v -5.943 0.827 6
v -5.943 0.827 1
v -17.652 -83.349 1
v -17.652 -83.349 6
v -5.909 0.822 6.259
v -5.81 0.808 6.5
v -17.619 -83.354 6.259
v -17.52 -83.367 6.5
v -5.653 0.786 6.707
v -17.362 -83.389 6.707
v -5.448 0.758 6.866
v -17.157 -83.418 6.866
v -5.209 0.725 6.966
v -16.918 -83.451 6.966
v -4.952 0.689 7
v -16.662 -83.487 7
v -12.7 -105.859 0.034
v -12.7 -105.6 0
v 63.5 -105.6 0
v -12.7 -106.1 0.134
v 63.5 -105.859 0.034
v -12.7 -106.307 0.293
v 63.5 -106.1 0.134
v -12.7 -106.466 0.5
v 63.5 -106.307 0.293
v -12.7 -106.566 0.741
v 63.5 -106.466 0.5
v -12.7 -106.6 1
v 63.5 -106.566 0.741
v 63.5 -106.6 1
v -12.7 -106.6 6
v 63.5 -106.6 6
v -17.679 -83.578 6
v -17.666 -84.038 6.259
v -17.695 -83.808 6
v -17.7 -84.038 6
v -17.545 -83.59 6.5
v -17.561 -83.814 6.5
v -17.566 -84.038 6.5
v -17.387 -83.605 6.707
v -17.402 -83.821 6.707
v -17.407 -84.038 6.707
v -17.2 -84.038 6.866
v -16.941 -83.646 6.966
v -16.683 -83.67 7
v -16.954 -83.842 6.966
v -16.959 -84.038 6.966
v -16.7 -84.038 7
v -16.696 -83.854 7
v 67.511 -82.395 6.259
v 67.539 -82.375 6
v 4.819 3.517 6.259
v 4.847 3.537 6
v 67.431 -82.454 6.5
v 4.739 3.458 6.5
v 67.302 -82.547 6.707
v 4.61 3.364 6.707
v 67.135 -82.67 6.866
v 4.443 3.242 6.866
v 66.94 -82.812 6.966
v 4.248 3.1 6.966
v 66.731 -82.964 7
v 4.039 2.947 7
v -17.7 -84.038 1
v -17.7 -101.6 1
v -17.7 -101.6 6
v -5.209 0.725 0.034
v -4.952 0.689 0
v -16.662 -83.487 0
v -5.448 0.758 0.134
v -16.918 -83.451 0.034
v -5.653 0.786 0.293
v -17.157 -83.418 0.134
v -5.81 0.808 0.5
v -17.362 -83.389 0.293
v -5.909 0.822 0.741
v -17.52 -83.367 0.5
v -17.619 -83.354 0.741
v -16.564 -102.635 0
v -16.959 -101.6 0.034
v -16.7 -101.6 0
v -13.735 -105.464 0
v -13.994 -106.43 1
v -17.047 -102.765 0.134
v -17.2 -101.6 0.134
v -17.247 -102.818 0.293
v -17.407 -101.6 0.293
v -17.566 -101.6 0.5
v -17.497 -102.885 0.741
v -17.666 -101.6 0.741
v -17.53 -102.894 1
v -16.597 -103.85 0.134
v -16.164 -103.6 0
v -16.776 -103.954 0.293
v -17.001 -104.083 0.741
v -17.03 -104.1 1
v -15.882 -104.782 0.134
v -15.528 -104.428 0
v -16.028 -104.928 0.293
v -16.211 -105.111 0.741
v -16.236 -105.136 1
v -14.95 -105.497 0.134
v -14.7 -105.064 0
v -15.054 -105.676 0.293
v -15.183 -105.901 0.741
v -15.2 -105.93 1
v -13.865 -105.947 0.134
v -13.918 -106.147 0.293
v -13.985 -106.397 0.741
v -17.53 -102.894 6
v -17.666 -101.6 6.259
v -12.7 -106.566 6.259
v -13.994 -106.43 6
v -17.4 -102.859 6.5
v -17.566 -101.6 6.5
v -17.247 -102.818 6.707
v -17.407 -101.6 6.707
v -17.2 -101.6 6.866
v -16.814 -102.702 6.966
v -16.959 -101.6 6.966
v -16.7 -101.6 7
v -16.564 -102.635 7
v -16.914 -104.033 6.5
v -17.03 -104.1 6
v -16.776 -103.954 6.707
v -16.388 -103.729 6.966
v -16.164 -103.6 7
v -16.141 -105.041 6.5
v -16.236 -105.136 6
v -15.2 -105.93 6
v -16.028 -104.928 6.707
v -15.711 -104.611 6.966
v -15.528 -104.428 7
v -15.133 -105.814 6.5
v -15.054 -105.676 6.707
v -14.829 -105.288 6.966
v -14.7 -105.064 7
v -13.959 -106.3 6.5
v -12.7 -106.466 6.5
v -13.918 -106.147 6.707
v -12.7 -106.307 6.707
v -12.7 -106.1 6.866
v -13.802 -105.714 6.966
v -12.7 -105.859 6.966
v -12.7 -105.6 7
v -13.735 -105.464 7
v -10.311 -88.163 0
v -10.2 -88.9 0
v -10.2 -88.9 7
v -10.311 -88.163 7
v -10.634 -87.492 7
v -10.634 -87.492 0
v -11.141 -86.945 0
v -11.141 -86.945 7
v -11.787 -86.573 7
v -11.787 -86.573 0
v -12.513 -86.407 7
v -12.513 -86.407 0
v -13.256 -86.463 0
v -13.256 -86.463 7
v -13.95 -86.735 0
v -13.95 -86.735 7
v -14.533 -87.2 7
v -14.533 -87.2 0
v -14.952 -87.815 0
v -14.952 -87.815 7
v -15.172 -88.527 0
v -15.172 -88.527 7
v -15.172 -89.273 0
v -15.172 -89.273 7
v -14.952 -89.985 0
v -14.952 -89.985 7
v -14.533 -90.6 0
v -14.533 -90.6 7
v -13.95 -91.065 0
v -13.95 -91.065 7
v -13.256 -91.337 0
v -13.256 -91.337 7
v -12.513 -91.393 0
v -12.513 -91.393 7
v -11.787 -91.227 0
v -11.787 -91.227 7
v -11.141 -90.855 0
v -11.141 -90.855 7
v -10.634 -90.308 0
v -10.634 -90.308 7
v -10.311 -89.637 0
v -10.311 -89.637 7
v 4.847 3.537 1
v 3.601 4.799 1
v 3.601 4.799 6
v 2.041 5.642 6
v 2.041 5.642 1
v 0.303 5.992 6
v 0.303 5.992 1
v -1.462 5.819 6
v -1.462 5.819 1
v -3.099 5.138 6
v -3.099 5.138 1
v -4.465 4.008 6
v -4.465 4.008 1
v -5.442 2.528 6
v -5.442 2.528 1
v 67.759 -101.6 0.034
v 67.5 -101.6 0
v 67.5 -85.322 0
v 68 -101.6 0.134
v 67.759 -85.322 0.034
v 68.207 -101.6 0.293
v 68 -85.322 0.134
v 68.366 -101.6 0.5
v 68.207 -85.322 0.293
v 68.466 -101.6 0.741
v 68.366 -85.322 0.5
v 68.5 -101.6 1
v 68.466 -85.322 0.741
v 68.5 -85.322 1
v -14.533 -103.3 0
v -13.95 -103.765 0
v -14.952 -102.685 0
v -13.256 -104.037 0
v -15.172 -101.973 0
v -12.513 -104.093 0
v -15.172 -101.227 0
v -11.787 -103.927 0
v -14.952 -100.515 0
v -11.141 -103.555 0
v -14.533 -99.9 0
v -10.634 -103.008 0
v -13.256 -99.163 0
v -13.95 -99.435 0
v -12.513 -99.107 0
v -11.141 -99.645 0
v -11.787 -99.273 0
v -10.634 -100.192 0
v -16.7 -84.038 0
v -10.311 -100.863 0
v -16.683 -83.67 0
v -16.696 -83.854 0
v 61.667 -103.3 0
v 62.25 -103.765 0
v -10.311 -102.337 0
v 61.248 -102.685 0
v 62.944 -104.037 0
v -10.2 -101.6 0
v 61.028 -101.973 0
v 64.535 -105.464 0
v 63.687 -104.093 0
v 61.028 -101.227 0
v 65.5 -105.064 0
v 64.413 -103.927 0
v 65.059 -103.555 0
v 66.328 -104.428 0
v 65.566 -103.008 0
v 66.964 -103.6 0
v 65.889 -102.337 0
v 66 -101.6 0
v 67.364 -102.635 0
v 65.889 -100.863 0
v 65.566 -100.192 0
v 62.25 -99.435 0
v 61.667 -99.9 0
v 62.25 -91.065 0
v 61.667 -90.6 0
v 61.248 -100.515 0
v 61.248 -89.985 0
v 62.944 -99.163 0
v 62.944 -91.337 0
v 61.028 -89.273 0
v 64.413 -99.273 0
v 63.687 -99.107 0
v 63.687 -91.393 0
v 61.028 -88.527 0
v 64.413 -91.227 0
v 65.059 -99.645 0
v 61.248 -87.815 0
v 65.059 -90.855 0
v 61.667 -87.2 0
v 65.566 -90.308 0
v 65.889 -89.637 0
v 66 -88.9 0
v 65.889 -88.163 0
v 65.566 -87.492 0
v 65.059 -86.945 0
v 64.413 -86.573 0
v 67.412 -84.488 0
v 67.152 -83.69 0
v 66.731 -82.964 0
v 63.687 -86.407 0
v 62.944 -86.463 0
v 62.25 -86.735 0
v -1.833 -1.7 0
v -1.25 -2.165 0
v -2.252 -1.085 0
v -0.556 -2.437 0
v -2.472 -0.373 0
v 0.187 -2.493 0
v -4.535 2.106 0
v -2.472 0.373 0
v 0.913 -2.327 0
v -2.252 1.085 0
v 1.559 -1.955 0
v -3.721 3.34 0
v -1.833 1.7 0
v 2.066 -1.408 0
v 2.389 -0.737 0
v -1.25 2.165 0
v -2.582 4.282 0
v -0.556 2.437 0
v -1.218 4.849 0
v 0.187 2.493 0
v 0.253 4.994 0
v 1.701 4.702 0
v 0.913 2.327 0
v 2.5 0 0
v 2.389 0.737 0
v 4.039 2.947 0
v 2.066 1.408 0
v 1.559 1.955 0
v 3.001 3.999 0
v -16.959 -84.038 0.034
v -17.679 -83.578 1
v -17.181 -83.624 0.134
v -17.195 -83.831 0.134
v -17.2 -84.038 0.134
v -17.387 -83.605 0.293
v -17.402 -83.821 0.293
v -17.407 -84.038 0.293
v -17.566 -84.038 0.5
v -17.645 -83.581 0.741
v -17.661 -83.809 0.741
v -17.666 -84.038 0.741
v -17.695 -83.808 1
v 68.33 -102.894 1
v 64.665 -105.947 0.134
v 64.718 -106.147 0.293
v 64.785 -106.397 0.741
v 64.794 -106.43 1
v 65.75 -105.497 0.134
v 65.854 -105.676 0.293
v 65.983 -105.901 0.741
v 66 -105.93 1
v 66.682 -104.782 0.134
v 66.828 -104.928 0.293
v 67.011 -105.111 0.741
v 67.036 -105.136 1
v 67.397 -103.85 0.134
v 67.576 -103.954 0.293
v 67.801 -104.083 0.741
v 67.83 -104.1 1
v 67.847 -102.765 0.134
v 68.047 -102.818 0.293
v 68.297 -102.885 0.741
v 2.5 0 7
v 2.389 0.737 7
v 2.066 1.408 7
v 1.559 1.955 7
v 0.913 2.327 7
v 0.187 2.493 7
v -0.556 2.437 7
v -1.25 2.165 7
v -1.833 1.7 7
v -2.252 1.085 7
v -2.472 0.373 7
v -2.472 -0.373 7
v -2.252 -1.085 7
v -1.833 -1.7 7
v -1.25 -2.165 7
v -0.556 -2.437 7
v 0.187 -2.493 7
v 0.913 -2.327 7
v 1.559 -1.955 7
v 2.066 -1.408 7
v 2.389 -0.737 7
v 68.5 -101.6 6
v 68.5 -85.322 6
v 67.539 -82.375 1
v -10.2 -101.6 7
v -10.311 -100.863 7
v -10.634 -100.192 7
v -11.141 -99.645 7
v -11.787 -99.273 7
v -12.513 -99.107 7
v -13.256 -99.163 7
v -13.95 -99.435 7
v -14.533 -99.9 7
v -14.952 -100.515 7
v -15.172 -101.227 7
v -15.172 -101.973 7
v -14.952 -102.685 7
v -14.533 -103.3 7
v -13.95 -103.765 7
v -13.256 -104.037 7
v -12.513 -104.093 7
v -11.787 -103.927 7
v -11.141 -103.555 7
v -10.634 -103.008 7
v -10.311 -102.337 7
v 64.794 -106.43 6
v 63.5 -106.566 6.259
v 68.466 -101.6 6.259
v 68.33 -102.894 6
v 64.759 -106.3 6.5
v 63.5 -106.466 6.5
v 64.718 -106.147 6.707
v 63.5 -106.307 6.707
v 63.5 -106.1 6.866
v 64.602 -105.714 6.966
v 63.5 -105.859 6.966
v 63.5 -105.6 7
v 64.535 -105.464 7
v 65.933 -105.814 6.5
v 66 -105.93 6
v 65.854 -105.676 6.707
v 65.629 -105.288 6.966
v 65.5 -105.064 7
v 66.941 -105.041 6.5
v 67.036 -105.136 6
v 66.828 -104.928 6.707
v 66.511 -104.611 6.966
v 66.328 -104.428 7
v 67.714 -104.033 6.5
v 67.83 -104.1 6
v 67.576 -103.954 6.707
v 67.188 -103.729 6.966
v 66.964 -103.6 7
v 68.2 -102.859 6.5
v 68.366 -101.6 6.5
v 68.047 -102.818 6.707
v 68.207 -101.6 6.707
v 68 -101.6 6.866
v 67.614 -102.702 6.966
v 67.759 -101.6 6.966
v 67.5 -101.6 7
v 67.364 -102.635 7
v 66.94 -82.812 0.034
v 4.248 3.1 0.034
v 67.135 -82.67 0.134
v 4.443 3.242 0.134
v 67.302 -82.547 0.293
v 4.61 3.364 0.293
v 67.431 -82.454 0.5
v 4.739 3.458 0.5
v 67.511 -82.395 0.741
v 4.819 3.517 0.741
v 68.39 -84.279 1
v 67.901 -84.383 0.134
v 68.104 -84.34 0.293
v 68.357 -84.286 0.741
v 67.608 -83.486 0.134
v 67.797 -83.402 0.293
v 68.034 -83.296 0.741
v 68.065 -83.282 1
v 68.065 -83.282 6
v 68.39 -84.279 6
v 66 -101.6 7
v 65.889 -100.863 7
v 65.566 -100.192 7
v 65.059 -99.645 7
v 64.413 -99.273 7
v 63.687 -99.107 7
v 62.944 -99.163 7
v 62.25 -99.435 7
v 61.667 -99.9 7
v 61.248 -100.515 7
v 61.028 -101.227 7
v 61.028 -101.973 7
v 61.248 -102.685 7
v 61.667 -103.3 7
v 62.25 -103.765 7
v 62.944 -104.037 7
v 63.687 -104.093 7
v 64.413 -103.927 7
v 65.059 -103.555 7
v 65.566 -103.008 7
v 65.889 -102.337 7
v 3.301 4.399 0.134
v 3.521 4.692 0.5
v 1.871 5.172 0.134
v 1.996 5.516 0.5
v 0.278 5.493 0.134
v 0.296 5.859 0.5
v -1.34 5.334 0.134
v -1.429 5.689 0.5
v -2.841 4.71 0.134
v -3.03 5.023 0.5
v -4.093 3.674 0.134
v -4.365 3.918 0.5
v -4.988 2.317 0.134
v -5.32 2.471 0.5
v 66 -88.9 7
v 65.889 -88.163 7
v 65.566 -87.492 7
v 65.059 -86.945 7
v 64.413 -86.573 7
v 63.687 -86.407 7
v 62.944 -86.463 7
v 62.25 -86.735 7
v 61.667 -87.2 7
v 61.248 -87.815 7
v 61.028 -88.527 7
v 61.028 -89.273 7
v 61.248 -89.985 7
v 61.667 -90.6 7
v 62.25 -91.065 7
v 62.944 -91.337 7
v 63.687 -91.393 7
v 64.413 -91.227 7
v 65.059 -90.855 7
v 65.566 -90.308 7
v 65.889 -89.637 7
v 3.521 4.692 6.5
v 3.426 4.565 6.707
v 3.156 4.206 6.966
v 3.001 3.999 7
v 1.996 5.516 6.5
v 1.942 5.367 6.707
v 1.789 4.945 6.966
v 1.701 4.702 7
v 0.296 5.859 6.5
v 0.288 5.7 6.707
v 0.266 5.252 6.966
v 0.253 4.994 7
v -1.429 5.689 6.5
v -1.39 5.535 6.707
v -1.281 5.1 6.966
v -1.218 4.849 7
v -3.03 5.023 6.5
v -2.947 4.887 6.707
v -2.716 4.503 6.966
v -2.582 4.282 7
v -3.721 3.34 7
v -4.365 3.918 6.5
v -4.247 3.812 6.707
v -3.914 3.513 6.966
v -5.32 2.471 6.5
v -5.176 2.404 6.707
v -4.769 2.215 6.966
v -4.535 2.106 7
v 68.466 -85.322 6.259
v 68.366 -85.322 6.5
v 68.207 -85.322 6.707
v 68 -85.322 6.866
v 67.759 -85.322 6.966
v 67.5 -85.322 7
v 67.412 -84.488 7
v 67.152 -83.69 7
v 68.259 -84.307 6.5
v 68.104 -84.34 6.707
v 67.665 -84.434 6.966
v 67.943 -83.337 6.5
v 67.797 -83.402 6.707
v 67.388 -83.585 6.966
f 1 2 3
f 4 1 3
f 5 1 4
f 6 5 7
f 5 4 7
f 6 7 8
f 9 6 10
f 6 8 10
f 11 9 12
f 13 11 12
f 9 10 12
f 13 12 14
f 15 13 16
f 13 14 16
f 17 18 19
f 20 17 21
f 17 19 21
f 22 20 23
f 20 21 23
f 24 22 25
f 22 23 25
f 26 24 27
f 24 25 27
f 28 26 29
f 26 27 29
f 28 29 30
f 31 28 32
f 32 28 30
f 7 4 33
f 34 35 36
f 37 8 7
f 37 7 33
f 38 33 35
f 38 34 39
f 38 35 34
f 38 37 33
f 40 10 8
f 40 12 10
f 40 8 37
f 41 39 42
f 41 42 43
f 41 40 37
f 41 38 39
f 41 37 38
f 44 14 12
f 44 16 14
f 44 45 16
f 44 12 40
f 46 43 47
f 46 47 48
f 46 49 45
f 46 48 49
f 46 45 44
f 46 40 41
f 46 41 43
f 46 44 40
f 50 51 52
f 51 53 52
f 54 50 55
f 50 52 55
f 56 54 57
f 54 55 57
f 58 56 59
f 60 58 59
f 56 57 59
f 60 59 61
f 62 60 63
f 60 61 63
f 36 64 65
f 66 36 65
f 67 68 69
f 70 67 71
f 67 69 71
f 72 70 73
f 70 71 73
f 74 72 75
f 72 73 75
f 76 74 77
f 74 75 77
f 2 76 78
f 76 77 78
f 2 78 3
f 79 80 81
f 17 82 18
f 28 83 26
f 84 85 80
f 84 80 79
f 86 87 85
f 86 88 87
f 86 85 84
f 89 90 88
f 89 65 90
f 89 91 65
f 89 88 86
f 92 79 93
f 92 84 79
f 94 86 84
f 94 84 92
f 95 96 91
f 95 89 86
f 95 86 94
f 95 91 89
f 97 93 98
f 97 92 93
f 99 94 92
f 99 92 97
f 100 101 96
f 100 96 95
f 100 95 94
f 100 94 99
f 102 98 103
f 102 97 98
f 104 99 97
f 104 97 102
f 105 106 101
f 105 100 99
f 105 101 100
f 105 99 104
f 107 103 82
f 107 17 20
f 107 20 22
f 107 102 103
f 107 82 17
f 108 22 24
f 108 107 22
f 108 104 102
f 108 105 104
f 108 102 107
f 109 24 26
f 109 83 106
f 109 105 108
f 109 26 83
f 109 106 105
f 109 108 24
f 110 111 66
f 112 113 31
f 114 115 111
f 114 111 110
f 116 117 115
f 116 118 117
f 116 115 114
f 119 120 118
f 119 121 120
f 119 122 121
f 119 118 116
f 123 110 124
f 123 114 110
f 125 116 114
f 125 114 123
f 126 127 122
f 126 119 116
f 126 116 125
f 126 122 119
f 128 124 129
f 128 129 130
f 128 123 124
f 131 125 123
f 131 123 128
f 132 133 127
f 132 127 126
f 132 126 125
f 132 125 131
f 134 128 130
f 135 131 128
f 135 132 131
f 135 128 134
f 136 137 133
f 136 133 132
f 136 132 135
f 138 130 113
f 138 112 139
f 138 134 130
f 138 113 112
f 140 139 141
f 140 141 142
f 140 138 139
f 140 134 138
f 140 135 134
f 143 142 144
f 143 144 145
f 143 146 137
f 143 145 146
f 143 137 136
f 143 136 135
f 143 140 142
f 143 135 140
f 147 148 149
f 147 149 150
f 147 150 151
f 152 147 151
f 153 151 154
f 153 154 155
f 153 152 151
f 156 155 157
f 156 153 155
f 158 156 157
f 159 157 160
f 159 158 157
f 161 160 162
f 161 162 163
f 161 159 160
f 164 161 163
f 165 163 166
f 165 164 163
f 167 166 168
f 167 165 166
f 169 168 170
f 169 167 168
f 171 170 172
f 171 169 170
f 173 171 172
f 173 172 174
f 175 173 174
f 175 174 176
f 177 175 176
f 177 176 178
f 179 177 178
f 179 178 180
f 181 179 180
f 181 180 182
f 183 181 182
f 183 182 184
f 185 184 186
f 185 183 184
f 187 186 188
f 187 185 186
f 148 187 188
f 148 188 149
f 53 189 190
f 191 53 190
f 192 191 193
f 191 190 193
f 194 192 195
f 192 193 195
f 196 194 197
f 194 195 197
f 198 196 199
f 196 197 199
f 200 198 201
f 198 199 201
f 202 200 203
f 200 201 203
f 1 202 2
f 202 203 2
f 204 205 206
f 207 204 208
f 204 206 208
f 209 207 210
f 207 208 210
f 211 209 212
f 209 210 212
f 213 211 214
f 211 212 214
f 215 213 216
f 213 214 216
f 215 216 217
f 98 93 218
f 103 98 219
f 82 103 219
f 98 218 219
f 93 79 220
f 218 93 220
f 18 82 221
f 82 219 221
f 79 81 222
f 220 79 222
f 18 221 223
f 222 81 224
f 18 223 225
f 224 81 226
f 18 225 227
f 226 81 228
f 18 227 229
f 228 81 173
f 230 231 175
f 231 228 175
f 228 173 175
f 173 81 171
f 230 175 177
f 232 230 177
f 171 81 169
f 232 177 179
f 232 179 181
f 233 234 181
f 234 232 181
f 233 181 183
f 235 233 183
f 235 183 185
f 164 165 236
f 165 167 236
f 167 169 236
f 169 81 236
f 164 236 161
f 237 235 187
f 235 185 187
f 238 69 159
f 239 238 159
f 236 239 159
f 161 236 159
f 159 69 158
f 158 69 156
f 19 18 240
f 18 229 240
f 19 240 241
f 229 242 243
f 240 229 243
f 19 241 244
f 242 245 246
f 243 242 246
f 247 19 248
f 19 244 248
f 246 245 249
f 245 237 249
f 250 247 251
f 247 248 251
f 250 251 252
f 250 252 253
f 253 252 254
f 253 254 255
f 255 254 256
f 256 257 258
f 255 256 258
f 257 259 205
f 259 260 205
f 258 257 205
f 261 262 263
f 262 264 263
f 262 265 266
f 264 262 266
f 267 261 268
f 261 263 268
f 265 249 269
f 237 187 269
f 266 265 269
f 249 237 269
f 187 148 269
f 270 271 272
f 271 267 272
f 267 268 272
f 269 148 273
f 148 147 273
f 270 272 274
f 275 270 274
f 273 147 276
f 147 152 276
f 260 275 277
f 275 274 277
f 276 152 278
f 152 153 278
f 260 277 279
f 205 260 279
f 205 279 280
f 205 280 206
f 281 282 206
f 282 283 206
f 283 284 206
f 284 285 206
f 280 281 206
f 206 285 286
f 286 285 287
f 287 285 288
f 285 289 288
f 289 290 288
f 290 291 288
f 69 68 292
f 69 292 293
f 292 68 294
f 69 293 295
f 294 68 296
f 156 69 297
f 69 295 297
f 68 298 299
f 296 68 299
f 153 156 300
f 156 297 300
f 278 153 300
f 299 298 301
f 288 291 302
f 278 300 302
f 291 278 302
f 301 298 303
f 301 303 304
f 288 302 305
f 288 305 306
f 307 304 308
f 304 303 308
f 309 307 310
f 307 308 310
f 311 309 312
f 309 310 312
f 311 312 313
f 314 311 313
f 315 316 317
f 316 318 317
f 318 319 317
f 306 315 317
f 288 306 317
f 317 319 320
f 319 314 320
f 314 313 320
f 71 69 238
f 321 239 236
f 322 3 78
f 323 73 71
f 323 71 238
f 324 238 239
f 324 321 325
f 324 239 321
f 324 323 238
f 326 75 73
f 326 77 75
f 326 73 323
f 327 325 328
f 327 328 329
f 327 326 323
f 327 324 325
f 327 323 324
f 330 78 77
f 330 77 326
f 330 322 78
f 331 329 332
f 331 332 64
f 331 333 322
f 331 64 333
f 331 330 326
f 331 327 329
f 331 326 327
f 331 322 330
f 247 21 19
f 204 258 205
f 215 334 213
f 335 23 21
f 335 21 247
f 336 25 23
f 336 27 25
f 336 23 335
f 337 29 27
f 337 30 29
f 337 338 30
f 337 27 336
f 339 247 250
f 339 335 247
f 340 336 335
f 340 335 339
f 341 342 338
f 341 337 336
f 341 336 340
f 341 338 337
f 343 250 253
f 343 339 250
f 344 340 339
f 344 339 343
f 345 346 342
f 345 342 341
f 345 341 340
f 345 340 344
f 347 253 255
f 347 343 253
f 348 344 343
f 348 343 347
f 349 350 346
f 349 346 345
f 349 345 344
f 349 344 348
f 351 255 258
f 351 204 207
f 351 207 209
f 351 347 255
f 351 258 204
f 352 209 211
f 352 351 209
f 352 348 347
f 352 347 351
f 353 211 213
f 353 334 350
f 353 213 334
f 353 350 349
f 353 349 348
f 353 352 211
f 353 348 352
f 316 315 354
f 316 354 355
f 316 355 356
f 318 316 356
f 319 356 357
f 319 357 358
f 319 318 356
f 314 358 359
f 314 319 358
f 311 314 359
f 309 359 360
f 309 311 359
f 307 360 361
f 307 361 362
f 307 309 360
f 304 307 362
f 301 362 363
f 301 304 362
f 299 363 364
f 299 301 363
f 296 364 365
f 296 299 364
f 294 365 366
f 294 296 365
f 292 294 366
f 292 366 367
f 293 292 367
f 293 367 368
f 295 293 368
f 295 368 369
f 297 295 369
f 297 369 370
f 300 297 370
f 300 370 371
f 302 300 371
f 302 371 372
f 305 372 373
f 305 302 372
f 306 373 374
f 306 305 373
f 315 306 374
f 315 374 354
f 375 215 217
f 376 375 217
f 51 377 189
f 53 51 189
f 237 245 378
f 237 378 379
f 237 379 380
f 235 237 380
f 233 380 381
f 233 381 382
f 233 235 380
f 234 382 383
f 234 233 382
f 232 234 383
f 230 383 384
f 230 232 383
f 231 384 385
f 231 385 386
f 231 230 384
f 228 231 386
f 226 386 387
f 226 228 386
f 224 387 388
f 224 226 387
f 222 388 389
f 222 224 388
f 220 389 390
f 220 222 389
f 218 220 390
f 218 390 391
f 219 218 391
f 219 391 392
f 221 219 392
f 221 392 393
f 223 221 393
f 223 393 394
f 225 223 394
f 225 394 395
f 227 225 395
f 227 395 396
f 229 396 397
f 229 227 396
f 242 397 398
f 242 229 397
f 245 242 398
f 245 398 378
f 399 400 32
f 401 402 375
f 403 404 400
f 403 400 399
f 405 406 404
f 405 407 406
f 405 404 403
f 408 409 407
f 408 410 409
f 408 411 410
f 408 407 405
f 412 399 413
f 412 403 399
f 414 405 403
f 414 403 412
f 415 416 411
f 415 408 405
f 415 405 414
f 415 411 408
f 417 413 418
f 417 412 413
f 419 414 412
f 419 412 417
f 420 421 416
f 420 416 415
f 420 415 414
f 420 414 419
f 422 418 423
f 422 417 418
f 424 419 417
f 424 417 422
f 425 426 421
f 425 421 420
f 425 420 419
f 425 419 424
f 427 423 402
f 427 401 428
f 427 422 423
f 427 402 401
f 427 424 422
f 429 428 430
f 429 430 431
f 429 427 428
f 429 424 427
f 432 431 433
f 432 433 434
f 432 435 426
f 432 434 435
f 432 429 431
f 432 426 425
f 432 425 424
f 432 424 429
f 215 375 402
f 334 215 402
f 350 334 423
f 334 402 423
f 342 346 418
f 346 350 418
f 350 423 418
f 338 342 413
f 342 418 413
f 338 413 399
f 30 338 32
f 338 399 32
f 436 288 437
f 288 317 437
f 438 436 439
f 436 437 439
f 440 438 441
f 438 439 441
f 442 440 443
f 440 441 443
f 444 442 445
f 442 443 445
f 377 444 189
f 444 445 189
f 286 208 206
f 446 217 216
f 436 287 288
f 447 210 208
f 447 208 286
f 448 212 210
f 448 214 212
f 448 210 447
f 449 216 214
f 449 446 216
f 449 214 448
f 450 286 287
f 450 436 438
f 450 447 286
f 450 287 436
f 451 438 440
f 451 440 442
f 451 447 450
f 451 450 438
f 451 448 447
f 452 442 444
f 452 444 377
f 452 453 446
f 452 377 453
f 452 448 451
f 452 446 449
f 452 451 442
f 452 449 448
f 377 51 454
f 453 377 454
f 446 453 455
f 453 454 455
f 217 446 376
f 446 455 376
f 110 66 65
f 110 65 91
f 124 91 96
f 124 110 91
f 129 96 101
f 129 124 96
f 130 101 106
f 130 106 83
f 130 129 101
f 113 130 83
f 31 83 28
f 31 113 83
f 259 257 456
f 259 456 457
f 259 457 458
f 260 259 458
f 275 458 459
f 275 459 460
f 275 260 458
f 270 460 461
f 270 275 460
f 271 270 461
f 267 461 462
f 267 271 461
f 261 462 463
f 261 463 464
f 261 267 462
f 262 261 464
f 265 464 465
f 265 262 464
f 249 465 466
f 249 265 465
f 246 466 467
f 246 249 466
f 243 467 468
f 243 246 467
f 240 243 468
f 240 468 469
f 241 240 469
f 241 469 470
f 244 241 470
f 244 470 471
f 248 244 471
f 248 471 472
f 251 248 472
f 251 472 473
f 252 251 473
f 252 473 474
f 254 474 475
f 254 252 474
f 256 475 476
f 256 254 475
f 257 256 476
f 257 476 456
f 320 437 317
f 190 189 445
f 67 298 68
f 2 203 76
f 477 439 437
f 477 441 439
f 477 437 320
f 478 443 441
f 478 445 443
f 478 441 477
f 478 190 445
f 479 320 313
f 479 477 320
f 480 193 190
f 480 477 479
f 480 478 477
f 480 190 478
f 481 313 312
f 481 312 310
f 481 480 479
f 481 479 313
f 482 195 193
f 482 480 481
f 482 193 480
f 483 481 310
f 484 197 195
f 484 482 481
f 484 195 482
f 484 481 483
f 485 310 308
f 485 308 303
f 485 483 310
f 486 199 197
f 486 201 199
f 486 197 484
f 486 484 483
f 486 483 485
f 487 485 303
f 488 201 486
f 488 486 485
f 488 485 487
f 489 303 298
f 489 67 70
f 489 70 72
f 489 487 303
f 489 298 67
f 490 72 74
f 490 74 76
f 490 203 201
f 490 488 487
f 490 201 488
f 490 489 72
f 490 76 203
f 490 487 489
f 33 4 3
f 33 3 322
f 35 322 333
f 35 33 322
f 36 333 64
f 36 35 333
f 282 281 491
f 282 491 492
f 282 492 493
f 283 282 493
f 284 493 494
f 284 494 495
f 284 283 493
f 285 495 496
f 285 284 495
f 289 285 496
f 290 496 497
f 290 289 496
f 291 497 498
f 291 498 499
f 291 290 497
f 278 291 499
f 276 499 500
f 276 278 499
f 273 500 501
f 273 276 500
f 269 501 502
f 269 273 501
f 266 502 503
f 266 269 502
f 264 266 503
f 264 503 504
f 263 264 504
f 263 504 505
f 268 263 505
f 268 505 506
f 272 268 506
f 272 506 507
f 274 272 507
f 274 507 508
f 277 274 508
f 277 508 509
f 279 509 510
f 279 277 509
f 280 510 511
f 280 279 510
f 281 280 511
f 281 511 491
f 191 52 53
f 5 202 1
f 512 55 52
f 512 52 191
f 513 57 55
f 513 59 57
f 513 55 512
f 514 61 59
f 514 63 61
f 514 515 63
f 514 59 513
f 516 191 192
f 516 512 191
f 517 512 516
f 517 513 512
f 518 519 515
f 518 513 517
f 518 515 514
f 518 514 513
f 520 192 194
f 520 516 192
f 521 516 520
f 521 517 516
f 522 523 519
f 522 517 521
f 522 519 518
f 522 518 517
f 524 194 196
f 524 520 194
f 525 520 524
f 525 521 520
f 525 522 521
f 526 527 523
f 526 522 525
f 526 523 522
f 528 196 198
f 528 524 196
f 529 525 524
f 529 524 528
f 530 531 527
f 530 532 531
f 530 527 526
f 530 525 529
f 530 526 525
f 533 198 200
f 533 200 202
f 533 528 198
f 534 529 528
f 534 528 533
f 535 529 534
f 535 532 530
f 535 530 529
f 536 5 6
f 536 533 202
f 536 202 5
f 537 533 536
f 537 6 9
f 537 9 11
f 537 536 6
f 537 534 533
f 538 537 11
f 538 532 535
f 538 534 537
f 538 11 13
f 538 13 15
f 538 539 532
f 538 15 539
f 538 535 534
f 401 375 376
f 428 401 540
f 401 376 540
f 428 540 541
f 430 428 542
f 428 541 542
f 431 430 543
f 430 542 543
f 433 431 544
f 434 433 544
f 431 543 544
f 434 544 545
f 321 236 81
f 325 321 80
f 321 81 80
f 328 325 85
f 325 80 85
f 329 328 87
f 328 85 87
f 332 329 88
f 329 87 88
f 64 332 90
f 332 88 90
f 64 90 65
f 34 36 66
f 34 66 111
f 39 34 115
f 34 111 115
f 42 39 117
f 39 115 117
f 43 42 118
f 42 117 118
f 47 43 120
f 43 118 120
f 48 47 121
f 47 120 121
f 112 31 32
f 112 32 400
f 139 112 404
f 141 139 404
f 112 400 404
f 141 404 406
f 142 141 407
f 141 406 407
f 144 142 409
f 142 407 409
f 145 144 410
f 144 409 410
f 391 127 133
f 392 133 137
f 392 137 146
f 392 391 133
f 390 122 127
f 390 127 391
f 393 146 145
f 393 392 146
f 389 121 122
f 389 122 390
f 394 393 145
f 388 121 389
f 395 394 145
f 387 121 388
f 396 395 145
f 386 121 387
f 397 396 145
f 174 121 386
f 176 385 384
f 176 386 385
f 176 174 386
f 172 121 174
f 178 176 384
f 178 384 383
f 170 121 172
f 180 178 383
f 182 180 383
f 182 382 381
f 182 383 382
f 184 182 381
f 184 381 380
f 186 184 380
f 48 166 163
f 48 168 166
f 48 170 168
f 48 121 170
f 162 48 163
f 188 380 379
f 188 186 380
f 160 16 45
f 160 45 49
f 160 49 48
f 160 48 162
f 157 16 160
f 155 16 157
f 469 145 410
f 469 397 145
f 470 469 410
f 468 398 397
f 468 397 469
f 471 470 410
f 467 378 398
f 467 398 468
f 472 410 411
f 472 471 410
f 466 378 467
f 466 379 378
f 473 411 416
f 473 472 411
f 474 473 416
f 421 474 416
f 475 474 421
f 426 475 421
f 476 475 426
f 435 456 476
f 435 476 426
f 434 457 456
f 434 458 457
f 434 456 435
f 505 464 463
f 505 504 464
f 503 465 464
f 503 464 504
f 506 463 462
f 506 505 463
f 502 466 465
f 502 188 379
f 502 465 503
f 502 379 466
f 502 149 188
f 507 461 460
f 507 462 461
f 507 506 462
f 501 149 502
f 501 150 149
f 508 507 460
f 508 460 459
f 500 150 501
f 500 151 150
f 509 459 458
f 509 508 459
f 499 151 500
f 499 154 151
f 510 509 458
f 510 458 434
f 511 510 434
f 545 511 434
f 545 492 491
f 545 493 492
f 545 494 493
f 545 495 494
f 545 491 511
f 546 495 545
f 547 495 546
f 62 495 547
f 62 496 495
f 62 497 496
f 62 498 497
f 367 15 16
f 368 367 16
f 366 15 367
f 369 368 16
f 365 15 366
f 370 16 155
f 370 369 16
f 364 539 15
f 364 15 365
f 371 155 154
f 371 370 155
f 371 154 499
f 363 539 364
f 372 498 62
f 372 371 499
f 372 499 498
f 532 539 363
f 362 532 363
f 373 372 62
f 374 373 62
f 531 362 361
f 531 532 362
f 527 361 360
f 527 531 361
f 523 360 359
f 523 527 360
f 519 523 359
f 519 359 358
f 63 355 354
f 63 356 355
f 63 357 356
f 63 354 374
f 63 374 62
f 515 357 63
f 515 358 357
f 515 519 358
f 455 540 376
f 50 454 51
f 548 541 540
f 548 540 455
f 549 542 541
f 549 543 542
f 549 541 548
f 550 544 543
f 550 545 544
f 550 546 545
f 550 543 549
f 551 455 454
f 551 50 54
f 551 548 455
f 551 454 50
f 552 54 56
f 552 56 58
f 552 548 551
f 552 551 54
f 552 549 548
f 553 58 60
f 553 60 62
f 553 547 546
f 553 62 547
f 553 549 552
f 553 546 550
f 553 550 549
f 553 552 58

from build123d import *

# Parameters (mm, degrees)
SKETCH1_R           = 2.5
SKETCH1_R_2         = 6
BOSS_EXTRUDE1_DEPTH = 7
FILLET1_R           = 5
FILLET2_R           = 1


with BuildPart() as part:
    # Sketch1 → Boss-Extrude1 (new body)
    # profile 1 of 2: a face of its own
    with BuildSketch(Plane.XY):
        with BuildLine():
            Line((-5.942775796, 0.826689684), (-17.7, -83.691780519))
            Line((-17.7, -83.691780519), (-17.7, -106.6))
            Line((-17.7, -106.6), (68.5, -106.6))
            Line((68.5, -106.6), (68.5, -83.691780519))
            Line((68.5, -83.691780519), (4.84674687, 3.5368128))
            ThreePointArc((4.84674687, 3.5368128), (5.704405369, 1.860042846), (6, 0))
            ThreePointArc((6, 0), (-0.414333936, -5.985676853), (-5.942775796, 0.826689684))
        make_face()
        with Locations((-12.7, -101.6)):
            Circle(SKETCH1_R, mode=Mode.SUBTRACT)
        with Locations((-12.7, -88.9)):
            Circle(SKETCH1_R, mode=Mode.SUBTRACT)
        with Locations((63.5, -101.6)):
            Circle(SKETCH1_R, mode=Mode.SUBTRACT)
        with Locations((63.5, -88.9)):
            Circle(SKETCH1_R, mode=Mode.SUBTRACT)
    # profile 2 of 2: a face of its own
    with BuildSketch(Plane.XY):
        Circle(SKETCH1_R_2)
        Circle(SKETCH1_R, mode=Mode.SUBTRACT)
    extrude(amount=BOSS_EXTRUDE1_DEPTH)

    # Fillet1
    fillet1_edges = [part.edges().sort_by_distance(p)[0] for p in [
        (68.5, -83.691780519, 3.5),
        (68.5, -106.6, 3.5),
        (-17.7, -106.6, 3.5),
        (-17.7, -83.691780519, 3.5),
    ]]
    fillet(fillet1_edges, radius=FILLET1_R)

    # Fillet2
    fillet2_edges = [part.edges().sort_by_distance(p)[0] for p in [
        (-1.461681114, 5.819234342, 7),
        (-1.461681114, 5.819234342, 0),
        (-17.7, -92.818942509, 0),
        (-17.7, -92.818942509, 7),
        (36.192851297, -39.418990098, 0),
        (68.5, -93.461068497, 0),
        (25.4, -106.6, 0),
        (-11.79754448, -41.261143632, 0),
        (-16.235533906, -105.135533906, 0),
        (67.035533906, -105.135533906, 0),
        (68.25367114, -83.77210129, 0),
        (-17.688064044, -83.692606737, 0),
        (-11.79754448, -41.261143632, 7),
        (36.192851297, -39.418990098, 7),
        (25.4, -106.6, 7),
        (68.5, -93.461068497, 7),
        (-16.235533906, -105.135533906, 7),
        (67.035533906, -105.135533906, 7),
        (68.25367114, -83.77210129, 7),
        (-17.688064044, -83.692606737, 7),
    ]]
    fillet(fillet2_edges, radius=FILLET2_R)


solid = part.part
